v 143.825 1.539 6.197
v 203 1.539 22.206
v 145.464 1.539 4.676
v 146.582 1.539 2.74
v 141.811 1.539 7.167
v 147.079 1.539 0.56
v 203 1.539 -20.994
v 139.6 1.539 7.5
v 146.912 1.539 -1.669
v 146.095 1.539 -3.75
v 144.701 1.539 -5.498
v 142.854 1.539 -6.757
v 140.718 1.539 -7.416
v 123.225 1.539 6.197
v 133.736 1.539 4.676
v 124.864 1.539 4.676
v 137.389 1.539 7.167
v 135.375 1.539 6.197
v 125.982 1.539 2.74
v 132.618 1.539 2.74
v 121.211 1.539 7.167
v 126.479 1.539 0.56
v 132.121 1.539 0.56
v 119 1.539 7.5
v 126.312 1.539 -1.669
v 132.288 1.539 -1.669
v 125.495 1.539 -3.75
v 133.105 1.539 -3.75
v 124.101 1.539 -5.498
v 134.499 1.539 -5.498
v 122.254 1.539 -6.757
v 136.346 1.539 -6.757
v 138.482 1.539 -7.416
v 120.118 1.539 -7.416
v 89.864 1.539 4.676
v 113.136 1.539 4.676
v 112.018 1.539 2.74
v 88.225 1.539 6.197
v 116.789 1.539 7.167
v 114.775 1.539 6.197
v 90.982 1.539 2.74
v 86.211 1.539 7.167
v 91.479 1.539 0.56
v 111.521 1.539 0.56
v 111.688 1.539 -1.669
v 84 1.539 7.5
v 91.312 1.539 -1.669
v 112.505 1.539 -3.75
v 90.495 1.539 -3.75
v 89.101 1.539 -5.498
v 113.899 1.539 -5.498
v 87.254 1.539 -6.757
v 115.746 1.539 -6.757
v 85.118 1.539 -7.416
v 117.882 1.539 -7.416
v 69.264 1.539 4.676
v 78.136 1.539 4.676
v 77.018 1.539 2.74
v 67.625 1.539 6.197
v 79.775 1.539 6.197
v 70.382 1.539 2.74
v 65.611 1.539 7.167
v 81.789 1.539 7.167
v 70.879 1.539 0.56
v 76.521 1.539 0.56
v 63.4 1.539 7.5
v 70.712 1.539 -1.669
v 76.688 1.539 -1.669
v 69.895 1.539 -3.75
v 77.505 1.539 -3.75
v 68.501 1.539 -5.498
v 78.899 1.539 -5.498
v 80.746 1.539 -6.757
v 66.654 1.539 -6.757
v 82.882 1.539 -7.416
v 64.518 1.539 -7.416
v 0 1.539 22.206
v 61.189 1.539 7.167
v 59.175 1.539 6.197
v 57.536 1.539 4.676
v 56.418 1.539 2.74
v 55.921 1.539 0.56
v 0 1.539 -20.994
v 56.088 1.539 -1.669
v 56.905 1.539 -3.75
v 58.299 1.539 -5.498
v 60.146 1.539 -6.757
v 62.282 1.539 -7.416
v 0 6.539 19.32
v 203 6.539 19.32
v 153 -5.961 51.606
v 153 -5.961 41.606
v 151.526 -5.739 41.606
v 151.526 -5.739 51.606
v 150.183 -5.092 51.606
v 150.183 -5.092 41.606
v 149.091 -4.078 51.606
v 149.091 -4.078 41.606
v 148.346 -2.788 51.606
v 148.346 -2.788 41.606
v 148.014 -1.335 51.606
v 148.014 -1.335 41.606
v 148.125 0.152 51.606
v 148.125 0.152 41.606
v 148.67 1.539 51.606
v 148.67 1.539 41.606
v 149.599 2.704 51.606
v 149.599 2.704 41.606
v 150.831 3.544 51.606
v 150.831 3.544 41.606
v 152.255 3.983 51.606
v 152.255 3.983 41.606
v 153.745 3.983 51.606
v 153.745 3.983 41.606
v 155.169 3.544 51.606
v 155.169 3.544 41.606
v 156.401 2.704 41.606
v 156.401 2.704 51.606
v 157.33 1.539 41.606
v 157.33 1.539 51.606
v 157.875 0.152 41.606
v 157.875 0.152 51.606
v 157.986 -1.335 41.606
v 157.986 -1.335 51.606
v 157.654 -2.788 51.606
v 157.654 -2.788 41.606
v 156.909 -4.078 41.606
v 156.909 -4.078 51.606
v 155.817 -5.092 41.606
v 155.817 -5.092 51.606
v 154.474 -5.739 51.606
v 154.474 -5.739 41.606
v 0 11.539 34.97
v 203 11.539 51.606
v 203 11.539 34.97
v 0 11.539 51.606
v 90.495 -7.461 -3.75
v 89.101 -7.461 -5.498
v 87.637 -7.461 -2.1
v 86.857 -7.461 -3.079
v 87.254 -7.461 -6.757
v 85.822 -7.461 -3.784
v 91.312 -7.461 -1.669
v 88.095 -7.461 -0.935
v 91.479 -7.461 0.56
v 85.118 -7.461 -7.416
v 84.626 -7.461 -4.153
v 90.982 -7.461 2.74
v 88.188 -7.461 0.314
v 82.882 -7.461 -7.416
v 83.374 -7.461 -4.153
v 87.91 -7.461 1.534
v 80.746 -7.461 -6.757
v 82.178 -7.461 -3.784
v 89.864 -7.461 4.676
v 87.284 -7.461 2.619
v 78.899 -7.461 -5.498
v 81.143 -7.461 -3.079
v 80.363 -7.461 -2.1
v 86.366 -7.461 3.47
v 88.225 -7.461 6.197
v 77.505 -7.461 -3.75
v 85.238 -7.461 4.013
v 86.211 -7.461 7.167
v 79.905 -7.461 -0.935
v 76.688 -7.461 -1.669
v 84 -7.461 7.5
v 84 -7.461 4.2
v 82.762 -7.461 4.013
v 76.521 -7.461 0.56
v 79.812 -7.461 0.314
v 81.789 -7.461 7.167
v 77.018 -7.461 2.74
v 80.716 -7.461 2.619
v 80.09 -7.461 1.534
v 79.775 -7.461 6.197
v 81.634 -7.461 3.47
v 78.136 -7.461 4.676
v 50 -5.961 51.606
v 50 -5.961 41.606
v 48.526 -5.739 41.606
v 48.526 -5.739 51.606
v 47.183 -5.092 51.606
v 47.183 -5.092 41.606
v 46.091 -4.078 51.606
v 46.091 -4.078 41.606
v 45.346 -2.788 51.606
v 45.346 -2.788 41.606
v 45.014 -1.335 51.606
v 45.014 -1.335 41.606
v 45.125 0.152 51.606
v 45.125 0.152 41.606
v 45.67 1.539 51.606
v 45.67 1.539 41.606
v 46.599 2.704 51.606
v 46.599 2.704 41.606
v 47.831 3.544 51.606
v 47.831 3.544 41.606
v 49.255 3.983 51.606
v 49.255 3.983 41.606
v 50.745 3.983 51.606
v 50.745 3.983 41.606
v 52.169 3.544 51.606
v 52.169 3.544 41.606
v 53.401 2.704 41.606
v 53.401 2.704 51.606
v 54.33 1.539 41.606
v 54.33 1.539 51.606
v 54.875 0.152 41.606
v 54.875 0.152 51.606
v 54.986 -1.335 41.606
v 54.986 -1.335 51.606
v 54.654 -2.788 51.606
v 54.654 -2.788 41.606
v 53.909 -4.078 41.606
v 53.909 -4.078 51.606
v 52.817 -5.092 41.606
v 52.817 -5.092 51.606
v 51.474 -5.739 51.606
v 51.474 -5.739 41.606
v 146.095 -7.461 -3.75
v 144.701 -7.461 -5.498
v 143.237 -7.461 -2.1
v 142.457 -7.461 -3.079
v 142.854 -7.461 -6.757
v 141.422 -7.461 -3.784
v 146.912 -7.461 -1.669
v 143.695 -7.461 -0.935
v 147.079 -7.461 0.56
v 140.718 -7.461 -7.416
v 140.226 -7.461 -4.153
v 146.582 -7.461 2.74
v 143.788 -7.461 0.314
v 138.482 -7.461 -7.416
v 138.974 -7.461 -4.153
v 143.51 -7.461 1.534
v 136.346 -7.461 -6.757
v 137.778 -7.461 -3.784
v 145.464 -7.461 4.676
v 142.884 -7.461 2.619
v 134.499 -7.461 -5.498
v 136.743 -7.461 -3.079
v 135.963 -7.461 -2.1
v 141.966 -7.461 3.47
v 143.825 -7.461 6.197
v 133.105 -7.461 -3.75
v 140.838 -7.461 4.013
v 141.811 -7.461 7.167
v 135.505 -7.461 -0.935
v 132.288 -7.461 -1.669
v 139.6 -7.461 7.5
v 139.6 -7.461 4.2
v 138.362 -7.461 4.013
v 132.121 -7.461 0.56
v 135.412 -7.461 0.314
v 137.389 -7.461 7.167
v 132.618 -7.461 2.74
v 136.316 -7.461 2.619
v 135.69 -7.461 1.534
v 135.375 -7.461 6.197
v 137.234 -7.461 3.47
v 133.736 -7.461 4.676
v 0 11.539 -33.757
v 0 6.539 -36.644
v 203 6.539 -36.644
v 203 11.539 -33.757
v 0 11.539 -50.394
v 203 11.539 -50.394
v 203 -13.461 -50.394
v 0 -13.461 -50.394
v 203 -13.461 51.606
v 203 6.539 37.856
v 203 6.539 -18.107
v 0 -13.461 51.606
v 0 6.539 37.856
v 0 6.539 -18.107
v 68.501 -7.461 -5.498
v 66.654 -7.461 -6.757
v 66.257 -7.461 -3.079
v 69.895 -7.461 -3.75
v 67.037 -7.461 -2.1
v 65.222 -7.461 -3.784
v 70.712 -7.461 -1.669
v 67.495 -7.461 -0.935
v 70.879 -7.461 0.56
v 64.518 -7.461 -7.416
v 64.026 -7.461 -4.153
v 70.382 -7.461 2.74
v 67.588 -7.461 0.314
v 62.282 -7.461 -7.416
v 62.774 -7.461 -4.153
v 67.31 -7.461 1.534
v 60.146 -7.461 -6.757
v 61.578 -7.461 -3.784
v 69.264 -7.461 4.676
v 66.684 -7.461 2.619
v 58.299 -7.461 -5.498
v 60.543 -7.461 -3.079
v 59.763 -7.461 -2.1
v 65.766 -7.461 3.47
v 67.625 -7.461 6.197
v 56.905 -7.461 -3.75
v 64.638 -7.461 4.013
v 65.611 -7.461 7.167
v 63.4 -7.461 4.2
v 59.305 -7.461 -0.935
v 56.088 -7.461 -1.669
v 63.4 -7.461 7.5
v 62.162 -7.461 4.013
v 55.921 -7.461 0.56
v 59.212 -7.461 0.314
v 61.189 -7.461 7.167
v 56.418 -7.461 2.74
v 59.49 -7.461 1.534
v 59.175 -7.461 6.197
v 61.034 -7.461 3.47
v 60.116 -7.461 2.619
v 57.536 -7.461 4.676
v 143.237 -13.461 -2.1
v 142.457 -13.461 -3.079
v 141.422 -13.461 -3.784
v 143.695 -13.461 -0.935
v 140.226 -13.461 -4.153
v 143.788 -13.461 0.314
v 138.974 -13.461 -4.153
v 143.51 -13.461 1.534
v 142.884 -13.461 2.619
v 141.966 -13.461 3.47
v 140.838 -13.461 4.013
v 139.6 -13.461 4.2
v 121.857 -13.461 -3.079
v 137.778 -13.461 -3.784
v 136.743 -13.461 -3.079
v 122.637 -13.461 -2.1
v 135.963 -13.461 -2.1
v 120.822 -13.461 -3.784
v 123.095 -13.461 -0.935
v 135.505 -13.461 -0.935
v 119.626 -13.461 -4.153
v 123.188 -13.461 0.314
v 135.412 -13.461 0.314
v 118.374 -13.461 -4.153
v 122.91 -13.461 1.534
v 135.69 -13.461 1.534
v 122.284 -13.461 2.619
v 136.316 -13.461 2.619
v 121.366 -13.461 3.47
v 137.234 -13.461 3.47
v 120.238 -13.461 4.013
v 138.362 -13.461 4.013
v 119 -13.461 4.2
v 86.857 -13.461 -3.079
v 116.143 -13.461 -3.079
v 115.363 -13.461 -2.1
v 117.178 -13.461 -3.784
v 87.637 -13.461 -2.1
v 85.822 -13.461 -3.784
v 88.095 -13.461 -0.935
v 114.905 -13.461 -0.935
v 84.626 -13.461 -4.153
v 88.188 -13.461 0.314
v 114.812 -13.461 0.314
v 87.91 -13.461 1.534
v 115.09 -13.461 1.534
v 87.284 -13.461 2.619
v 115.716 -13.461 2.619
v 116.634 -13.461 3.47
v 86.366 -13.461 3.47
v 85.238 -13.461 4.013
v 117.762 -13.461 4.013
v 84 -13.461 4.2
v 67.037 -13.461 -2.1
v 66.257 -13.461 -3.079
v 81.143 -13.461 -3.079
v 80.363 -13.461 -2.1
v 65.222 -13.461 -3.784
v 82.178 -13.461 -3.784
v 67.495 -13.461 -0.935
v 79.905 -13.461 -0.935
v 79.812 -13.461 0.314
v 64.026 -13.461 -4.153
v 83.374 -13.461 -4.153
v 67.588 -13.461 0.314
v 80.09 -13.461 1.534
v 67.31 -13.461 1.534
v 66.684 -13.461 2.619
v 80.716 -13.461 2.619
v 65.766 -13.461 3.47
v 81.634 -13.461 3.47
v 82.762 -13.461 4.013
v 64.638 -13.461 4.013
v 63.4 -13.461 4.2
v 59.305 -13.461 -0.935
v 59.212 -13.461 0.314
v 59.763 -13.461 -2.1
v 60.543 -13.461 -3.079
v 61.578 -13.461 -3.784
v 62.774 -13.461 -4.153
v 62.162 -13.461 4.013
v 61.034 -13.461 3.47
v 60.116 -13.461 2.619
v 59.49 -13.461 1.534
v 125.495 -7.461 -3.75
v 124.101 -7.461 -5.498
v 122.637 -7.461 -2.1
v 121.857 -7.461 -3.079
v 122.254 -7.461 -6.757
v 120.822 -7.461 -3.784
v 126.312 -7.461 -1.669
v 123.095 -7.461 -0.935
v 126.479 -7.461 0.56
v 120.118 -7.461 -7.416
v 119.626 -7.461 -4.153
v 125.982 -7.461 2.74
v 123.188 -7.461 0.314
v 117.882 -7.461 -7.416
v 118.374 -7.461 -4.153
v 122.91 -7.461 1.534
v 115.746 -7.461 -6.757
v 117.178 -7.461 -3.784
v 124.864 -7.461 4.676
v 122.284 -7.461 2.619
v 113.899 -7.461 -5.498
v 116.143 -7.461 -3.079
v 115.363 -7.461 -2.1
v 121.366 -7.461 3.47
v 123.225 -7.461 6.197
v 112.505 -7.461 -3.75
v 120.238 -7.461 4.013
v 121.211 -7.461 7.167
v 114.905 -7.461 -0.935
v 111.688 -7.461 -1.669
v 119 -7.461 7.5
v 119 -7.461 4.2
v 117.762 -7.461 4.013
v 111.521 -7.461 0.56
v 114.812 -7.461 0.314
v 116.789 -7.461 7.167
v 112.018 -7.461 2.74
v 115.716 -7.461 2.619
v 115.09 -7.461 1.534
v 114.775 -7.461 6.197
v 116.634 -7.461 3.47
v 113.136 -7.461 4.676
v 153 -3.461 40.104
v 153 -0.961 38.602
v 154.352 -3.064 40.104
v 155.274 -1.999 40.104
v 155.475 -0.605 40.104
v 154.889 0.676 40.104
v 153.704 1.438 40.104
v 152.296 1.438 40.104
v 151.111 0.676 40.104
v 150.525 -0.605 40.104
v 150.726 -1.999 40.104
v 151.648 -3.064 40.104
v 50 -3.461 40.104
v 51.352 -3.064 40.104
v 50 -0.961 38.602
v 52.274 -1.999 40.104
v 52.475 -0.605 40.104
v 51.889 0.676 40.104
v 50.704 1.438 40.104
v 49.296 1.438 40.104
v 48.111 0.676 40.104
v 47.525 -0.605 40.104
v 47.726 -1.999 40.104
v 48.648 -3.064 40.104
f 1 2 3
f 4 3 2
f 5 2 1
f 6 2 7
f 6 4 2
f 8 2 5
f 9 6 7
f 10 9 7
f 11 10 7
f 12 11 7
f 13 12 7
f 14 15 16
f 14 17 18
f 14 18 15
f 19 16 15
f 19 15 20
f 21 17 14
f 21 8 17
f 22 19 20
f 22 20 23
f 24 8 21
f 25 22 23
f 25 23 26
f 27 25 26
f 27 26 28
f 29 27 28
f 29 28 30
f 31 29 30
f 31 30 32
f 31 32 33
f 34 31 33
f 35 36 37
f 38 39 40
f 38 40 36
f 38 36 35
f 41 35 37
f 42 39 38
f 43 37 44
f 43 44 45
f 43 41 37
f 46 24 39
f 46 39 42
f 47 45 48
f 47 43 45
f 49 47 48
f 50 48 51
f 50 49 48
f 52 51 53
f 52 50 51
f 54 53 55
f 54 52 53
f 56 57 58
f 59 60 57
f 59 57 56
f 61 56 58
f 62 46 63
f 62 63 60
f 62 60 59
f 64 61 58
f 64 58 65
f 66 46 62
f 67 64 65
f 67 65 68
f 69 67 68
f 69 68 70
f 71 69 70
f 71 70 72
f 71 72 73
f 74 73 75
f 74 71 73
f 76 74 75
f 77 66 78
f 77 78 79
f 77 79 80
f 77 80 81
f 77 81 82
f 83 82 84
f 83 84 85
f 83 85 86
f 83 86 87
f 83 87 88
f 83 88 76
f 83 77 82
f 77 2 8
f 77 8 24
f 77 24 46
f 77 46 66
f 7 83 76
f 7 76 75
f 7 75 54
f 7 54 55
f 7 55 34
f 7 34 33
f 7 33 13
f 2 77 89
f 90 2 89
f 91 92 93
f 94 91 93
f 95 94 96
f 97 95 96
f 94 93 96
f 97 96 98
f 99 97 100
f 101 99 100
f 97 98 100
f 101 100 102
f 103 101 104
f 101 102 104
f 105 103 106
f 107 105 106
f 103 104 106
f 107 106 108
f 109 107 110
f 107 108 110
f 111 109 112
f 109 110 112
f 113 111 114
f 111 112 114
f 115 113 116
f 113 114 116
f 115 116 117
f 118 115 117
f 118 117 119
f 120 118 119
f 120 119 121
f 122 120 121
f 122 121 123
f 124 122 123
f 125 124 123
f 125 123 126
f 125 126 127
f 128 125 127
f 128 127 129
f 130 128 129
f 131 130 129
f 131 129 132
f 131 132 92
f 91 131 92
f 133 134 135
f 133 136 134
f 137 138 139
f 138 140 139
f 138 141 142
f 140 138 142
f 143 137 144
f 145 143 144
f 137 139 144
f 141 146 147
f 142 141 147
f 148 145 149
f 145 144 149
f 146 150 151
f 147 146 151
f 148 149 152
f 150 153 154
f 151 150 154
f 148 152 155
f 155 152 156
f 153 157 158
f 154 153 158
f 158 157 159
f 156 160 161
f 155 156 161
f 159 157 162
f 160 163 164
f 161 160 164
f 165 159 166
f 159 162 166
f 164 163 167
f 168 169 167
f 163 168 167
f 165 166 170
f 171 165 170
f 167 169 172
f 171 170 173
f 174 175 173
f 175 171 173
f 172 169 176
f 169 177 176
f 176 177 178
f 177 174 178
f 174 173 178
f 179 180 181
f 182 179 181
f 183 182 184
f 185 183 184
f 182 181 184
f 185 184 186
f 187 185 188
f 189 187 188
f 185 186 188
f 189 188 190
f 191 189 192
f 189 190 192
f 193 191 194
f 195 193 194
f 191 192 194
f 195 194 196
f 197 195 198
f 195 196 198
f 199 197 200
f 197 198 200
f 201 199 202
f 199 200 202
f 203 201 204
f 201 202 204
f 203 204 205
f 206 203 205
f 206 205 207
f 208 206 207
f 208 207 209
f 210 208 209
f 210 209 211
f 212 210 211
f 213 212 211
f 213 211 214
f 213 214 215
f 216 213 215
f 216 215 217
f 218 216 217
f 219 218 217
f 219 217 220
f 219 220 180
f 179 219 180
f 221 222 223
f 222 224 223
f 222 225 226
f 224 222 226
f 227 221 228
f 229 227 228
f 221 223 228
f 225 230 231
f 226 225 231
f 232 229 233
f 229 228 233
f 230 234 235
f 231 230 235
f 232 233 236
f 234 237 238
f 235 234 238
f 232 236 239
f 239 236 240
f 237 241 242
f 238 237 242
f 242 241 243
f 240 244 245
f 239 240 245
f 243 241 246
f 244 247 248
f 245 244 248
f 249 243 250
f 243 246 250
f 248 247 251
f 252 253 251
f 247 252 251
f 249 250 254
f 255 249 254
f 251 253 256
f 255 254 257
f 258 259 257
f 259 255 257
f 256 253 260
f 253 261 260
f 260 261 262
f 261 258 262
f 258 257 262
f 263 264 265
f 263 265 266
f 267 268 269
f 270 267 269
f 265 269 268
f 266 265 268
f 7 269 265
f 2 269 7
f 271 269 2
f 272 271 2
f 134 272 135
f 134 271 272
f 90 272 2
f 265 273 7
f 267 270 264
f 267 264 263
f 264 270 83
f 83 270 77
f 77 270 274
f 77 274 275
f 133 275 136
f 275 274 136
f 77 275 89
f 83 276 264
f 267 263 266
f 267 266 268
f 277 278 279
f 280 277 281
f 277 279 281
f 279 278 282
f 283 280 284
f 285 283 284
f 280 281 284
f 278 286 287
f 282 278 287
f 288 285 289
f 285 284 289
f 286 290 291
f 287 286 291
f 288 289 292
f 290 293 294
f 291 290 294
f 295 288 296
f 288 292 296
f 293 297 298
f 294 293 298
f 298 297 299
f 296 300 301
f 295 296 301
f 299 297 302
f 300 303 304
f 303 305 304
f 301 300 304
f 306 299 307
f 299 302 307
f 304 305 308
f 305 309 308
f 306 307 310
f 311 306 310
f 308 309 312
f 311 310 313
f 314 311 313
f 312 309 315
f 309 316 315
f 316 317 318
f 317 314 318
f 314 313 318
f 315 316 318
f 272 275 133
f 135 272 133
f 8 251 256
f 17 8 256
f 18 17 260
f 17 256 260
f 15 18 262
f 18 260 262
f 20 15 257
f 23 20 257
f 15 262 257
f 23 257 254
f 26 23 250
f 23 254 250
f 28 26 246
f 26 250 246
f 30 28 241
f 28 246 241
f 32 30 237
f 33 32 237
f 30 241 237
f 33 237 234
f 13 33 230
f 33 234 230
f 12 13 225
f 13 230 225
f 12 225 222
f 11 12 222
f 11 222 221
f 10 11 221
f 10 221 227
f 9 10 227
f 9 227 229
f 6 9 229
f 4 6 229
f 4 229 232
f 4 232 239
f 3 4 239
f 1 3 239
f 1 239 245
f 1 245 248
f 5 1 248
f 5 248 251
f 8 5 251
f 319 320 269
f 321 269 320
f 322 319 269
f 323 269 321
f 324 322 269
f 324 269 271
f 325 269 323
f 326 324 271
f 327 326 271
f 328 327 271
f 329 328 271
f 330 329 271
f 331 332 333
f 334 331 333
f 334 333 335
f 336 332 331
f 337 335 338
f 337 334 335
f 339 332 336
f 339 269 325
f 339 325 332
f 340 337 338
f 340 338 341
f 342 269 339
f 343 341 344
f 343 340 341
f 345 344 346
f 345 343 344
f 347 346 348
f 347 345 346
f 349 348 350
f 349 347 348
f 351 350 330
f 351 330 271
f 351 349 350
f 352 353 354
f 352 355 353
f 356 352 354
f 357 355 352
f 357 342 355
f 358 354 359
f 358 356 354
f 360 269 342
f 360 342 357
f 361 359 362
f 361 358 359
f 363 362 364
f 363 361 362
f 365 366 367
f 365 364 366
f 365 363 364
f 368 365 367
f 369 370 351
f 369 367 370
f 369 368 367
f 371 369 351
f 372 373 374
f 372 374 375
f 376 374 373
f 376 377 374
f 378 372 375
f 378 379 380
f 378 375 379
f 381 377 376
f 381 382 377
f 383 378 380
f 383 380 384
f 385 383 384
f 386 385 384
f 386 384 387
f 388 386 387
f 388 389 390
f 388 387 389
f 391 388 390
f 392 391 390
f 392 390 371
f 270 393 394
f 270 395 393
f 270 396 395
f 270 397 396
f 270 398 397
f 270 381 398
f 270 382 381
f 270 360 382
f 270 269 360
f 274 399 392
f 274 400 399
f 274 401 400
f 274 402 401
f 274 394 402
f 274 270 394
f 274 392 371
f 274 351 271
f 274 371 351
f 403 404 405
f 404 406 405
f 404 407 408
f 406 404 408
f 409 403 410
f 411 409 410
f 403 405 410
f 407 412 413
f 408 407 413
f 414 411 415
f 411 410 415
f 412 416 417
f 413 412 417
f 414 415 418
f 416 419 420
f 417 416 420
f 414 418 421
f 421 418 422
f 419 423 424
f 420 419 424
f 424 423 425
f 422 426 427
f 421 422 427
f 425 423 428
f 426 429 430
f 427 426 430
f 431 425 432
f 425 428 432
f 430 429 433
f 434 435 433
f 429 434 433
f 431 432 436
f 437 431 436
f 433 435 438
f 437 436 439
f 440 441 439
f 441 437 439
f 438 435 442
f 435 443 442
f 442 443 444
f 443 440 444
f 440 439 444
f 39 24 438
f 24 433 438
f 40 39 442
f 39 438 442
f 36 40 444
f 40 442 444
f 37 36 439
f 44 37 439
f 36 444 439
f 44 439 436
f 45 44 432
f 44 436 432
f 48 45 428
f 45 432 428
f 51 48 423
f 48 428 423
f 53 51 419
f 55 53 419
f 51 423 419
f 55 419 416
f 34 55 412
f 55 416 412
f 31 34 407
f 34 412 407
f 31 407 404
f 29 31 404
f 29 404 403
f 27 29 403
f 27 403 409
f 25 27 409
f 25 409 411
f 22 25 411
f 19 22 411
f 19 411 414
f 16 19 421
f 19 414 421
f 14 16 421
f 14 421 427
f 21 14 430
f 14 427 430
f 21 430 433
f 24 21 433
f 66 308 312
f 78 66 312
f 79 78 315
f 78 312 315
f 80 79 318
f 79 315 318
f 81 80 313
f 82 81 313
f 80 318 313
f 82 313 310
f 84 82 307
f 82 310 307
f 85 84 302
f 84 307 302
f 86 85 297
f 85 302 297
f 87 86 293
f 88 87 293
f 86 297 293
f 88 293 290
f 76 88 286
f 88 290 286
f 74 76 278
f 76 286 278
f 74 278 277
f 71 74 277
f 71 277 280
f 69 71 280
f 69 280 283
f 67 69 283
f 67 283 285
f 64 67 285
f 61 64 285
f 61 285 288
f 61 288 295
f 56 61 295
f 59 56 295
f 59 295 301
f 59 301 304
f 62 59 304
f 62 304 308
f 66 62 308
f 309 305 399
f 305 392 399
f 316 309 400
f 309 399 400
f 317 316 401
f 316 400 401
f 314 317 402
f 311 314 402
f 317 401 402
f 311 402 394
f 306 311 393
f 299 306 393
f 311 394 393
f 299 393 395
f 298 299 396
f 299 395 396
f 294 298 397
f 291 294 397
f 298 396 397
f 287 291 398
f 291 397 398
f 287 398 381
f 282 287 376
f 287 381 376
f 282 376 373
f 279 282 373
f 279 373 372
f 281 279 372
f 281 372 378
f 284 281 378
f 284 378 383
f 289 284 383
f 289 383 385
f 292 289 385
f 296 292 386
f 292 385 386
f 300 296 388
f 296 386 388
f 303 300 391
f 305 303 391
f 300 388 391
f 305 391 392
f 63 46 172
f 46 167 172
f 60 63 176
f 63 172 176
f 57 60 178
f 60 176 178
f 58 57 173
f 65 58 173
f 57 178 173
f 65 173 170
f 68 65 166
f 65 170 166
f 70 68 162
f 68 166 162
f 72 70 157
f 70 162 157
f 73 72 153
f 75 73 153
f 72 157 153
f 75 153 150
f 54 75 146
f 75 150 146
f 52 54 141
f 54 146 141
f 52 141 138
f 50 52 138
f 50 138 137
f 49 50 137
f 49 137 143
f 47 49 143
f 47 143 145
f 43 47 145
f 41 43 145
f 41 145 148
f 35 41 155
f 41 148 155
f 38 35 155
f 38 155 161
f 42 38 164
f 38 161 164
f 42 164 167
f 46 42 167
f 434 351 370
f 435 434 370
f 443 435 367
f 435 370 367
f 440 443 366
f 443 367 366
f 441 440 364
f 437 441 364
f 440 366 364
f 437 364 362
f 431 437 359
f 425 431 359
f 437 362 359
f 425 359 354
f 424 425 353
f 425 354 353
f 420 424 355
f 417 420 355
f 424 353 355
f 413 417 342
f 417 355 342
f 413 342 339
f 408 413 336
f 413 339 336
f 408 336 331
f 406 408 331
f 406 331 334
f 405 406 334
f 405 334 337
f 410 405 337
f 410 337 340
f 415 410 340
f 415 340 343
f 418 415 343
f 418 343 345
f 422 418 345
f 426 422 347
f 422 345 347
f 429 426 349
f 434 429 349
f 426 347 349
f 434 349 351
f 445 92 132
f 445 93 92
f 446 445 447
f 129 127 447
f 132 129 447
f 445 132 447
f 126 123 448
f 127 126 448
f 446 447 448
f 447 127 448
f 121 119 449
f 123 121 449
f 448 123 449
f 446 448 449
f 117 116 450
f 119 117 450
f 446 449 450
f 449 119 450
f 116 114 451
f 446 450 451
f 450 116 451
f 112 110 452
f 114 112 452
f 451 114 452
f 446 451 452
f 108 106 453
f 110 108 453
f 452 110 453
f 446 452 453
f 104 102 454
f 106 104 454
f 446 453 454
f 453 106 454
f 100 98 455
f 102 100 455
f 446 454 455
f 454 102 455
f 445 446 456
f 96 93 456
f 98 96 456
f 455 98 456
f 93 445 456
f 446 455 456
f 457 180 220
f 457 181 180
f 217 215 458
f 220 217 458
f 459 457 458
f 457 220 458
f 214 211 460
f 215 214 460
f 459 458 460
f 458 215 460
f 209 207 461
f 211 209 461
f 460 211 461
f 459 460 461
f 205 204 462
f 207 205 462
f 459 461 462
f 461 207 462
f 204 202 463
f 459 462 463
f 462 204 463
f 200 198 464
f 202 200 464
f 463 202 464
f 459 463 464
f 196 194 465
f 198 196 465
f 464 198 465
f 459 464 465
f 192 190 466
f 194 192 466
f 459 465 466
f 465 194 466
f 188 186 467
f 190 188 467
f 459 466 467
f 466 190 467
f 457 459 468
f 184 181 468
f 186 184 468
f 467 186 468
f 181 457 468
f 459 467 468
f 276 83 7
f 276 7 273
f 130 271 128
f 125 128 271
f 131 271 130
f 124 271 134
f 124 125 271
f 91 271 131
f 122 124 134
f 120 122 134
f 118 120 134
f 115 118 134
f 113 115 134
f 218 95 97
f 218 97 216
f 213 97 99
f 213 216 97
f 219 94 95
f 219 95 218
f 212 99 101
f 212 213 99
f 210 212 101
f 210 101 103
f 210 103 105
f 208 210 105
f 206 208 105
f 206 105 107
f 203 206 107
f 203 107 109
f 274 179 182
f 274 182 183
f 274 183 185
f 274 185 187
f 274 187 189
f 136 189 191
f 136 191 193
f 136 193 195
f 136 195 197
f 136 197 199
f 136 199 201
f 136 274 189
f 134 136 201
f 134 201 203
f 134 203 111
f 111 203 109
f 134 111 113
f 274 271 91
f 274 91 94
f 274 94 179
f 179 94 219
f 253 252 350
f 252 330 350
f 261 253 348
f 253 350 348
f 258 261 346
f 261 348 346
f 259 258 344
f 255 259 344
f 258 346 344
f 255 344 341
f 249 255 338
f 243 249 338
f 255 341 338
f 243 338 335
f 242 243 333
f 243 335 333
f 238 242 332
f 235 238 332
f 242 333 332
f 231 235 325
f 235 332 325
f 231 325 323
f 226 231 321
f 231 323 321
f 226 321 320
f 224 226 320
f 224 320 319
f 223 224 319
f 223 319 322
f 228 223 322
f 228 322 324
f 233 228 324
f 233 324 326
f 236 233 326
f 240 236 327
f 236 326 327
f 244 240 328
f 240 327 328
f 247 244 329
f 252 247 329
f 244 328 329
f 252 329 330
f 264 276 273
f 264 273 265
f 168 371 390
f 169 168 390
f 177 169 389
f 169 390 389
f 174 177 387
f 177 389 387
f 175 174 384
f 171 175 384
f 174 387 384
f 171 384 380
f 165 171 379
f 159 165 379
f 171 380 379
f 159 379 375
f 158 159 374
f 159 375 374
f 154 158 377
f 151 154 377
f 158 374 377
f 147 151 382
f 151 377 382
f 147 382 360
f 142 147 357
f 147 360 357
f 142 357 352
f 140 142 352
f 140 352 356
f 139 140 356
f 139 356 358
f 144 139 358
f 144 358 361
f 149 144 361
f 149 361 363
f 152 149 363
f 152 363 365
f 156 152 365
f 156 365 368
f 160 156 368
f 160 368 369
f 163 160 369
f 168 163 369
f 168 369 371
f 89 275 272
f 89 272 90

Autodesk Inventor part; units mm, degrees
ref_plane "YZ Plane" through (0, 0, 0) normal (1, 0, 0) x (0, 1, 0)
ref_plane "XZ Plane" through (0, 0, 0) normal (0, 1, 0) x (-1, 0, 0)
ref_plane "XY Plane" through (0, 0, 0) normal (0, 0, 1) x (1, 0, 0)
sketch "Sketch1" plane through (0, 0, 0) normal (1, 0, 0) x (0, 1, 0)
  line L0 (-13.4609, 51.6064) -> (11.5391, 51.6064)
  line L1 (11.5391, -50.3936) -> (-13.4609, -50.3936)
  line L2 (-13.4609, -50.3936) -> (-13.4609, 51.6064)
  line L3 (-13.4609, 51.6064) -> (11.5391, -50.3936) construction
  line L4 (11.5391, 51.6064) -> (-13.4609, -50.3936) construction
  line L5 (1.5391, 22.2064) -> (1.5391, -20.9936)
  line L6 (6.5391, 37.8564) -> (11.5391, 34.9696)
  line L7 (6.5391, -36.6436) -> (11.5391, -33.7569)
  line L8 (6.5391, -36.6436) -> (13.9505, -36.6436) construction
  line L9 (1.5391, 22.2064) -> (6.5391, 19.3196)
  line L10 (1.5391, -20.9936) -> (6.5391, -18.1069)
  line L11 (6.5391, 37.8564) -> (6.5391, 19.3196)
  line L12 (6.5391, -18.1069) -> (6.5391, -36.6436)
  line L13 (11.5391, 51.6064) -> (11.5391, 34.9696)
  line L14 (11.5391, -33.7569) -> (11.5391, -50.3936)
  point P0 (-0.9609, 0.6064)
  dimension "d2" = 25
  dimension "d3" = 102
  dimension "d4" = 43.2
  dimension "d5" = 21.6
  dimension "d6" = 74.5
  dimension "d7" = 37.25
  dimension "d10" = 30
extrude "Extrusion1" add sketch "Sketch1" along normal blind 203
sketch "Sketch2" plane through (0, 1.5391, 22.2064) normal (0, 1, 0) x (1, 0, 0)
  point P0 (0, 22.2064)
  point P1 (63.4, 22.2064)
  point P2 (139.6, 22.2064)
  dimension "d14" = 76.2
  dimension "d15" = 63.4
hole "Hole1" at (63.4, 1.5391, 0) at (139.6, 1.5391, 0) direction (0, -1, 0) diameter 8.4 end through all counterbore diameter 15 counterbore depth 9
sketch "Sketch3" plane through (0, 1.5391, 22.2064) normal (0, 1, 0) x (1, 0, 0)
  point P0 (0, 22.2064)
  point P1 (84, 22.2064)
  point P2 (119, 22.2064)
  dimension "d23" = 35
  dimension "d24" = 84
hole "Hole2" at (84, 1.5391, 0) at (119, 1.5391, 0) direction (0, -1, 0) diameter 8.4 end through all counterbore diameter 15 counterbore depth 9
sketch "Sketch4" plane through (0, -13.4609, 51.6064) normal (0, 0, 1) x (1, 0, 0)
  line L0 (0, 0) -> (203, 0) projected
  line L1 (0, 0) -> (0, 25) projected
  line L2 (203, 25) -> (203, 0) projected
  point P0 (0, 13.4609)
  point P1 (50, 12.5)
  point P2 (153, 12.5)
  dimension "d32" = 12.5
  dimension "d33" = 12.5
  dimension "d34" = 50
  dimension "d35" = 50
hole "Hole3" at (50, -0.9609, 51.6064) at (153, -0.9609, 51.6064) direction (0, 0, -1) diameter 10 depth 10 tip angle 118
properties part number "czescuchwytu" material "Iron, Cast"
